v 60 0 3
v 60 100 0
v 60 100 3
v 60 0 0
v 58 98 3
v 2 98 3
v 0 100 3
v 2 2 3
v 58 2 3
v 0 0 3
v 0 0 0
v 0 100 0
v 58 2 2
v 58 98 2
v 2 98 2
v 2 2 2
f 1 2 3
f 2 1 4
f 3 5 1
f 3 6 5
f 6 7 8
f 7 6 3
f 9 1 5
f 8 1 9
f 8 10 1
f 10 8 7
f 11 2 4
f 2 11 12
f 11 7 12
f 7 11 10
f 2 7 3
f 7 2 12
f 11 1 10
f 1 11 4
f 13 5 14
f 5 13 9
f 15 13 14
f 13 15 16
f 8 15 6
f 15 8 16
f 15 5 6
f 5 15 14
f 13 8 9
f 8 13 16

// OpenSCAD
// file: constants.scad
//panel dimensions
pwidth = 60;
pheight = 100;

//side dimensions
swidth = 50;
sheight = pheight + 40;
sidepannel_margin = 1;

thickness1 = 2;
thickness2 = 3;
grovedepth = 2;

mfold = 5;

$fn = 100;
// file: panels.scad
include <constants.scad>

//mount dimensions
outer_mount = 15;
inner_mount = 10;
mount_dist = 25;
mount_margin = 15;
mount_pheight = 6;

module panel(){
    difference(){
	cube([pwidth, pheight, thickness2]);
	translate([grovedepth, grovedepth, thickness1]){
	    cube([pwidth-grovedepth*2, pheight-grovedepth*2, thickness2]);
	}
    }
}
// main file
include <panels.scad>

module friskbylogo(){
    translate([7.5,50,0]){
	scale([0.2, 0.2, 0.026])
	    surface(file="friskby.png");
    }
}

module front(){
    union(){
	panel();
	friskbylogo();
    }
}

front();
